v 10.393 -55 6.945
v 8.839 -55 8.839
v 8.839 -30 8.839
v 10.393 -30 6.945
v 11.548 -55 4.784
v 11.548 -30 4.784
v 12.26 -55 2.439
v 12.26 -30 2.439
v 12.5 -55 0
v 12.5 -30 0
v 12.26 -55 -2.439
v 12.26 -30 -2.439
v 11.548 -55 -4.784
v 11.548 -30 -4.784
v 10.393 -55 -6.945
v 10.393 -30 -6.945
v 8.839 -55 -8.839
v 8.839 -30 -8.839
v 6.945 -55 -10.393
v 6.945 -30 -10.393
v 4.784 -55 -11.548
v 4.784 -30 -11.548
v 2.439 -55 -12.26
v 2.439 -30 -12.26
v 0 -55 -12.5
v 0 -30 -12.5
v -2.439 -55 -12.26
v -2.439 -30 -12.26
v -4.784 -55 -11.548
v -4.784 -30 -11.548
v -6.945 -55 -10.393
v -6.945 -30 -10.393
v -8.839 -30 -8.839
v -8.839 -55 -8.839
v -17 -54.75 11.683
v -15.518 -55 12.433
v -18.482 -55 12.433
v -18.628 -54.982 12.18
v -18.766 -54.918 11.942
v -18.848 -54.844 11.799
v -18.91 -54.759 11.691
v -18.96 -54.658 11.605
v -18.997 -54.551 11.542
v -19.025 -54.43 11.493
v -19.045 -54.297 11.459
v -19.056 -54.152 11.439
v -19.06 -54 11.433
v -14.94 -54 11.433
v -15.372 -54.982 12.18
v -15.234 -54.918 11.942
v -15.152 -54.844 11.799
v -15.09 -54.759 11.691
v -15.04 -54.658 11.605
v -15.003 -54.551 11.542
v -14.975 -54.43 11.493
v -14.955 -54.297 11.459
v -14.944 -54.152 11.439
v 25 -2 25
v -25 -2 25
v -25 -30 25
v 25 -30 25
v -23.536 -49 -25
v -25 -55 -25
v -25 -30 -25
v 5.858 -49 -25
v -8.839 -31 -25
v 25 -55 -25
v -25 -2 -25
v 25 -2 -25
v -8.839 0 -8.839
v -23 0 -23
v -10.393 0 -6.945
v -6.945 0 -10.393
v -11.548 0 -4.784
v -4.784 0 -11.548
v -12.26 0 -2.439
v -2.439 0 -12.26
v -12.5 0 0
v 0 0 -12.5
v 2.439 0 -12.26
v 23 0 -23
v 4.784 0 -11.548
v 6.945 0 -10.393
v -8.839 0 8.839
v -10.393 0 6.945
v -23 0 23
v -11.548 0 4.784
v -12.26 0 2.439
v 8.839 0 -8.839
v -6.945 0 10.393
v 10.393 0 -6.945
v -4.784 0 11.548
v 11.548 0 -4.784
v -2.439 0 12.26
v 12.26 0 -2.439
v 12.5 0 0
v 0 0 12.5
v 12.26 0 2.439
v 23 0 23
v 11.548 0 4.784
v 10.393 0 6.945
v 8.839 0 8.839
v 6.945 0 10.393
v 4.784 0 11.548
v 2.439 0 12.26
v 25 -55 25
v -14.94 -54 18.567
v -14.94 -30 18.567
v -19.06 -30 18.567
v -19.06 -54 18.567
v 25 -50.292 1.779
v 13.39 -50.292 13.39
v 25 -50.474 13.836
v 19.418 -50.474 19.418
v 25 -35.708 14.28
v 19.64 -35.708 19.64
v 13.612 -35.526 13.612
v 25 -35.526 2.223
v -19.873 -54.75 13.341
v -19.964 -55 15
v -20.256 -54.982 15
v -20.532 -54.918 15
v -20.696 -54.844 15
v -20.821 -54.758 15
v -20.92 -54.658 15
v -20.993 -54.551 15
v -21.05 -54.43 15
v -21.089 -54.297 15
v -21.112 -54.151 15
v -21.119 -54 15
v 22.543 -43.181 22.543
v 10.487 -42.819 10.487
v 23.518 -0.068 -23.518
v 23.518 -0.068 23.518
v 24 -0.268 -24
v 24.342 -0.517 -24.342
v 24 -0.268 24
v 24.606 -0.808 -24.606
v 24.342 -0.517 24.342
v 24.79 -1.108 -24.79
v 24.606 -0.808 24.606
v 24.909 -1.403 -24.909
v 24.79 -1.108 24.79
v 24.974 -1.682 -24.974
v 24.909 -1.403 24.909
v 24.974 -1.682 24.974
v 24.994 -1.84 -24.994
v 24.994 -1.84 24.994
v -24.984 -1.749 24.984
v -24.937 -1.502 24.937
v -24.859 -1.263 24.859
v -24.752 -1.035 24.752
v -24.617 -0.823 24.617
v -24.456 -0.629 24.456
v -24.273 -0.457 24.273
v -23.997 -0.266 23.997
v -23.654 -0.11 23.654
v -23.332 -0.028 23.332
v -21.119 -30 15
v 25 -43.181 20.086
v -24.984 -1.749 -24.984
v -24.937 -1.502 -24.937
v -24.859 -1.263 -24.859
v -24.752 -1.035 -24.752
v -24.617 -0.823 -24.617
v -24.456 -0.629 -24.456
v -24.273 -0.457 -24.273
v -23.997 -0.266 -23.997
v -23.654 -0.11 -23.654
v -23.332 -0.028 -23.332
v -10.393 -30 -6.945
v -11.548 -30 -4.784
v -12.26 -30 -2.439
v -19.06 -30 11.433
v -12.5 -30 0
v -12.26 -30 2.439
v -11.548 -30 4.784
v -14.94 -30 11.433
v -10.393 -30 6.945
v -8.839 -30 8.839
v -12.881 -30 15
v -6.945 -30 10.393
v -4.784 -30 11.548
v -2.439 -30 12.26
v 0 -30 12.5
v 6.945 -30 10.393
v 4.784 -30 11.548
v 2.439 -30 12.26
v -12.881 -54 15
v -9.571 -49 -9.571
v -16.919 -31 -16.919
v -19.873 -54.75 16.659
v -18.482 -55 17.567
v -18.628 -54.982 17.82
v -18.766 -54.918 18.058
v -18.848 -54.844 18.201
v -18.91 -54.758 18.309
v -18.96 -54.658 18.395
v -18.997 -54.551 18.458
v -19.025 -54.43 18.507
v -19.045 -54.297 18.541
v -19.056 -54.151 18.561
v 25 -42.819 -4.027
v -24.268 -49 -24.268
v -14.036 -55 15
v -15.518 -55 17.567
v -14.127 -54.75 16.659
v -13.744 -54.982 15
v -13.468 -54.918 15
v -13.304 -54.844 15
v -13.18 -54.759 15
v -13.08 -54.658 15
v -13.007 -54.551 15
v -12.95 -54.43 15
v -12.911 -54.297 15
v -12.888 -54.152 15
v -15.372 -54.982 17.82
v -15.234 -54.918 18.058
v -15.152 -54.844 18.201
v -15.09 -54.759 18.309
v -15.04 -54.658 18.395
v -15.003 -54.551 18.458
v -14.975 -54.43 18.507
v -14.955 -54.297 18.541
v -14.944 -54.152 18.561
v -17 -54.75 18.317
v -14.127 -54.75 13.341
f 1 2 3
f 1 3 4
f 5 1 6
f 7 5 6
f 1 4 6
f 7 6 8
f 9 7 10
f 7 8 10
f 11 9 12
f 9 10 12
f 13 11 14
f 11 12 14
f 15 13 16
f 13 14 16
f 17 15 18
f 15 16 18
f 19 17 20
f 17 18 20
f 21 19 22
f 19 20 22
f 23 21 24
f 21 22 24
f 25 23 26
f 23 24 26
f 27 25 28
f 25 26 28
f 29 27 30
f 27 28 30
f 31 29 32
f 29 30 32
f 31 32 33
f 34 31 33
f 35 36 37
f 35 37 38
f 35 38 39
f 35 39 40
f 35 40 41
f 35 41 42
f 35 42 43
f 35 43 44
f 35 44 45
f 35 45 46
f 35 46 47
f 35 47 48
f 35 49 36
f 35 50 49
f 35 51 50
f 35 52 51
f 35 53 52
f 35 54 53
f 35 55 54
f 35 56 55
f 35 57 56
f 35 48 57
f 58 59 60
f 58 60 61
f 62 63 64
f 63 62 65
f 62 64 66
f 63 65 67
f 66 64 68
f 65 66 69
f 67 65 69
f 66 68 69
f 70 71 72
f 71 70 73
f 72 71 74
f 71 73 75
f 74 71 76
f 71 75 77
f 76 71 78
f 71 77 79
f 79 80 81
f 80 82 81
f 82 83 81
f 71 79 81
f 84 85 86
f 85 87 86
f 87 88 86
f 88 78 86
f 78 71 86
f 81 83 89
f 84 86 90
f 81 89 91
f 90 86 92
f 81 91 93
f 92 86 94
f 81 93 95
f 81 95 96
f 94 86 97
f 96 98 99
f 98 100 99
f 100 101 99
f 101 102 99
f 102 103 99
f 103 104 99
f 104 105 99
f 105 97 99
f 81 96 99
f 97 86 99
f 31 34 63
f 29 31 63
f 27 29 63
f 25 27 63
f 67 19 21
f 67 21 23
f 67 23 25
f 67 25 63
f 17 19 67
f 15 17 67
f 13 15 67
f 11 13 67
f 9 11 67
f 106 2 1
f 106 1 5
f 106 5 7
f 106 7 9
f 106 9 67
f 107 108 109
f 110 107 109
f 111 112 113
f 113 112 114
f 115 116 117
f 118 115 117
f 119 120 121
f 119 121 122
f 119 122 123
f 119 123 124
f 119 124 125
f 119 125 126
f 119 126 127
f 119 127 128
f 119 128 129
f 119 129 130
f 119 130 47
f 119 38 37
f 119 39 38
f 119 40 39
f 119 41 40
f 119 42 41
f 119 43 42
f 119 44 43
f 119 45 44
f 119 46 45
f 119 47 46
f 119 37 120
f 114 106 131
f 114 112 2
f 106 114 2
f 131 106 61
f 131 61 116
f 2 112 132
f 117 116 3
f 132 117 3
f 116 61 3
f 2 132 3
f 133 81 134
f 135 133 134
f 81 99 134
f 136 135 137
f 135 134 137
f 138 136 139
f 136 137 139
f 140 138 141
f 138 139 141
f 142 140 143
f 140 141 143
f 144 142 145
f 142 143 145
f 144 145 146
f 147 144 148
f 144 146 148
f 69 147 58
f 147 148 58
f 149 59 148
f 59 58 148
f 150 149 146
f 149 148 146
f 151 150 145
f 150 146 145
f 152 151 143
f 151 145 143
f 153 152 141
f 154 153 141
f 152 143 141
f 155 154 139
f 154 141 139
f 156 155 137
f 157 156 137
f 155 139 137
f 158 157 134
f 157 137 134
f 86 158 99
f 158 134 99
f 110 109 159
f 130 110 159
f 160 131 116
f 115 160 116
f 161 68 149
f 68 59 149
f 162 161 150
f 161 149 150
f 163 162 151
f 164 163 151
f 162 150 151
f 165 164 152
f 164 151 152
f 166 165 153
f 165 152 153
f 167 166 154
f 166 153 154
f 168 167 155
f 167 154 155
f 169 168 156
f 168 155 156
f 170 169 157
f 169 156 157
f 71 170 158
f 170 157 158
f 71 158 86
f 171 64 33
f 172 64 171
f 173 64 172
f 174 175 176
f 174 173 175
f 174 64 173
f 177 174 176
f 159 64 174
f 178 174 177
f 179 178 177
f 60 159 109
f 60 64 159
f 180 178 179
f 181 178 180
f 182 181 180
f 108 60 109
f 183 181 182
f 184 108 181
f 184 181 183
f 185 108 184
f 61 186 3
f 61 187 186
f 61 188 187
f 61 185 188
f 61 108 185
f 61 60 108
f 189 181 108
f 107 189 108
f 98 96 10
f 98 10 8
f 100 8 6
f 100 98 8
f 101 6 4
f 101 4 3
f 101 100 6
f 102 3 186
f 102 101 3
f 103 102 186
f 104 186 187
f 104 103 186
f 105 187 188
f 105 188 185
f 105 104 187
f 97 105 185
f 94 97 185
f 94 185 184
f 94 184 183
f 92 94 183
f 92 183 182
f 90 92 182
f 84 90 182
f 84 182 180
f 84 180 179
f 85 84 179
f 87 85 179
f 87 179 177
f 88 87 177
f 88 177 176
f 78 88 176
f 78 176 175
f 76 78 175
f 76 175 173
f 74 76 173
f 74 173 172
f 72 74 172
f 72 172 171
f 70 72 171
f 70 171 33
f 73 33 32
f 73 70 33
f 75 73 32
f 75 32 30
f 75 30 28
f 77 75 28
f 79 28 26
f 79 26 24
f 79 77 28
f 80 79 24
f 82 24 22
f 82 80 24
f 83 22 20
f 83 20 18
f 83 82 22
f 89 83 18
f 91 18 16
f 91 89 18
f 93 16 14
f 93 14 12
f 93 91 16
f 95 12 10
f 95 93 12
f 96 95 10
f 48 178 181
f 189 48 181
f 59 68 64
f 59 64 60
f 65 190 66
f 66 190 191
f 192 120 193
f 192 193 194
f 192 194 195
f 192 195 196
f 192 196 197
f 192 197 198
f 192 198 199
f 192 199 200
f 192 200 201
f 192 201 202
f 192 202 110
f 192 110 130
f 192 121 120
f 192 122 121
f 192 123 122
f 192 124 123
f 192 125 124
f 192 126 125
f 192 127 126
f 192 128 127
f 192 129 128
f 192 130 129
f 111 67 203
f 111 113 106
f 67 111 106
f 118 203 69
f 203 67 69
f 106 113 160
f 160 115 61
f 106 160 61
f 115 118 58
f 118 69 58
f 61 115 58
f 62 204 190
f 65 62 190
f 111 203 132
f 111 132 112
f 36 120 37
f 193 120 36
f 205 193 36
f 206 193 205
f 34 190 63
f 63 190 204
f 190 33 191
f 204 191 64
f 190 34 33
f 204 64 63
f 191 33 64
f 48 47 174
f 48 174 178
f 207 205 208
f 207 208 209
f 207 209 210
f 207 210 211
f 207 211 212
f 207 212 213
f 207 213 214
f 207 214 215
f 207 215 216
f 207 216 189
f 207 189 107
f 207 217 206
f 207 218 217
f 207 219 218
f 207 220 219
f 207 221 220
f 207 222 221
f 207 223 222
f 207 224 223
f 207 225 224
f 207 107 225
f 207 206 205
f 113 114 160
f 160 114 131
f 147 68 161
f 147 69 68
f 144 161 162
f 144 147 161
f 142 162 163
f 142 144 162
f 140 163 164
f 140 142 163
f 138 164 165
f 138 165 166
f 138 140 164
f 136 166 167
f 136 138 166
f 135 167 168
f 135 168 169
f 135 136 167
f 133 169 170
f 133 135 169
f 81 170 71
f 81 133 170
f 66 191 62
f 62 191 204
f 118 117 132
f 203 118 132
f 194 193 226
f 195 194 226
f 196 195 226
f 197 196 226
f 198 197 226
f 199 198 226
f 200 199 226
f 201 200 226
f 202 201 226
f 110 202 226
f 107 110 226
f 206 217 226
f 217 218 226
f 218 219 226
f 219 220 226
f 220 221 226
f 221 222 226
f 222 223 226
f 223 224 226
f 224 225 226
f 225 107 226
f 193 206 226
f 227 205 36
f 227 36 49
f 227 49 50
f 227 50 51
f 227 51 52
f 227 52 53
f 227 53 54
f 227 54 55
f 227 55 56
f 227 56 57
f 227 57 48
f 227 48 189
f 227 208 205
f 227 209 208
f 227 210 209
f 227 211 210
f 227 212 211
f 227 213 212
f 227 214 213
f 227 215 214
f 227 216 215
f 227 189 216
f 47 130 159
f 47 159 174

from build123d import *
from build123d import SkipClean  # not in build123d's __all__

# Parameters (mm, degrees)
F0_W        = 50
F0_H        = 50
F0_R        = 12.5
F1_DEPTH    = 30
F2_DEPTH    = 25
F4_DEPTH    = 25
F6_DEPTH    = 50
F8_DEPTH    = 25
F9_T1_DEPTH = 9.1191559928
F9_T3_DEPTH = 9.1191559928
F9_T5_DEPTH = 9.1191559928
F9_T7_DEPTH = 9.1191559928
F9_T9_DEPTH = 9.1191559928
F10_R       = 2


# Not quite as in the source:
# - a fillet or chamfer that OpenCascade refuses, or shapes differently, is made with other operations: its cross-section is extruded or revolved along the edge and cut away or added
# - after a boolean that leaves OpenCascade's solid faulty, fix() repairs it


with BuildPart() as f1:
    # F0 (on Front) → F1 (new body)
    with BuildSketch(Plane.XZ):
        Rectangle(F0_W, F0_H)
        Circle(F0_R, mode=Mode.SUBTRACT)
    extrude(amount=F1_DEPTH)

    # F0 (on Front) → F2 (join)
    with BuildSketch(Plane.XZ):
        Rectangle(F0_W, F0_H)
        Circle(F0_R, mode=Mode.SUBTRACT)
    extrude(amount=F2_DEPTH)

    # F3 (on face) → F4 (join)
    with BuildSketch(Plane.XZ.offset(30)):
        with BuildLine():
            Line((-8.8388347648, -8.8388347648), (-25, -25))
            Line((-25, -25), (25, -25))
            Line((25, -25), (25, 25))
            Line((25, 25), (8.8388347648, 8.8388347648))
            ThreePointArc((8.8388347648, 8.8388347648), (8.8388347648, -8.8388347648), (-8.8388347648, -8.8388347648))
        make_face()
    with SkipClean():  # cleaning this boolean's faces spoils the solid; the shape is the same uncleaned
        extrude(amount=F4_DEPTH)

    # F5 (on face) → F6 (cut)
    with BuildSketch(Plane(origin=(0, 0, 0), x_dir=(0.7071067812, 0, 0.7071067812), z_dir=(-0.7071067812, 0, 0.7071067812))):
        Polygon((-23.9276695297, -31), (-34.3199743751, -49), (-13.5353646843, -49), align=None)
        Polygon((19.249809042, -35.5263909924), (14.8302387921, -42.8186887872), (18.9357688095, -50.2922977948), (27.4608690767, -50.4736090076), (31.8804393265, -43.1813112128), (27.7749093092, -35.7077022052), align=None)
    extrude(amount=-F6_DEPTH, mode=Mode.SUBTRACT)

    add(f1.part.fix(), mode=Mode.REPLACE)

    # F7 (on face) → F8 (join)
    with BuildSketch(Plane.XZ.offset(30)):
        Polygon((-19.0595779964, 11.4327062681), (-14.9404220036, 11.4327062681), (-12.8808440072, 15), (-14.9404220036, 18.5672937319), (-19.0595779964, 18.5672937319), (-21.1191559928, 15), align=None)
    extrude(amount=F8_DEPTH)

    # F9: fillet of radius 1 on 6 edges, made by hand

    # F9_s2 → F9_t1 (cut)
    with BuildSketch(Plane(origin=(4.5249795266, 0, 7.8374944433), x_dir=(0, 1, 0), z_dir=(-0.5, 0, -0.8660254038))):
        with BuildLine():
            add(Edge.make_bspline(
                [(-54, -25.7897255963), (-55, -25.7897255963), (-55, -24.7897255963)],
                knots=[0, 0, 0, 1, 1, 1], degree=2, weights=[1, 1, 1]))
            Line((-55, -24.7897255963), (-55, -25.7897255963))
            Line((-55, -25.7897255963), (-54, -25.7897255963))
        make_face()
    extrude(amount=F9_T1_DEPTH, mode=Mode.SUBTRACT)

    # F9_s4 → F9_t3 (cut)
    with BuildSketch(Plane(origin=(-13.0249795266, 0, 22.5599263076), x_dir=(0, 1, 0), z_dir=(0.5, 0, -0.8660254038))):
        with BuildLine():
            add(Edge.make_bspline(
                [(-54, -10.7897255963), (-55, -10.7897255963), (-55, -9.7897255963)],
                knots=[0, 0, 0, 1, 1, 1], degree=2, weights=[1, 1, 1]))
            Line((-55, -9.7897255963), (-55, -10.7897255963))
            Line((-55, -10.7897255963), (-54, -10.7897255963))
        make_face()
    extrude(amount=F9_T3_DEPTH, mode=Mode.SUBTRACT)

    # F9_s6 → F9_t5 (cut)
    with BuildSketch(Plane.YZ.offset(-21.5595779964)):
        with BuildLine():
            add(Edge.make_bspline(
                [(-54, 11.4327062681), (-55, 11.4327062681), (-55, 12.4327062681)],
                knots=[0, 0, 0, 1, 1, 1], degree=2, weights=[1, 1, 1]))
            Line((-55, 12.4327062681), (-55, 11.4327062681))
            Line((-55, 11.4327062681), (-54, 11.4327062681))
        make_face()
        with BuildLine():
            add(Edge.make_bspline(
                [(-54, 18.5672937319), (-55, 18.5672937319), (-55, 17.5672937319)],
                knots=[0, 0, 0, 1, 1, 1], degree=2, weights=[1, 1, 1]))
            Line((-55, 17.5672937319), (-55, 18.5672937319))
            Line((-55, 18.5672937319), (-54, 18.5672937319))
        make_face()
    extrude(amount=F9_T5_DEPTH, mode=Mode.SUBTRACT)

    # F9_s8 → F9_t7 (cut)
    with BuildSketch(Plane(origin=(-0.0345984698, 0, -0.0599263076), x_dir=(0, 1, 0), z_dir=(0.5, 0, 0.8660254038))):
        with BuildLine():
            add(Edge.make_bspline(
                [(-54, 18.6551381324), (-55, 18.6551381324), (-55, 19.6551381324)],
                knots=[0, 0, 0, 1, 1, 1], degree=2, weights=[1, 1, 1]))
            Line((-55, 19.6551381324), (-55, 18.6551381324))
            Line((-55, 18.6551381324), (-54, 18.6551381324))
        make_face()
    extrude(amount=F9_T7_DEPTH, mode=Mode.SUBTRACT)

    # F9_s10 → F9_t9 (cut)
    with BuildSketch(Plane(origin=(-8.4654015302, 0, 14.6625055567), x_dir=(0, 1, 0), z_dir=(-0.5, 0, 0.8660254038))):
        with BuildLine():
            add(Edge.make_bspline(
                [(-54, 3.6551381324), (-55, 3.6551381324), (-55, 4.6551381324)],
                knots=[0, 0, 0, 1, 1, 1], degree=2, weights=[1, 1, 1]))
            Line((-55, 4.6551381324), (-55, 3.6551381324))
            Line((-55, 3.6551381324), (-54, 3.6551381324))
        make_face()
    extrude(amount=F9_T9_DEPTH, mode=Mode.SUBTRACT)

    # F10
    f10_edges = [f1.edges().sort_by_distance(p)[0] for p in [
        (25, 0, 0),
        (0, 0, -25),
        (-25, 0, 0),
        (0, 0, 25),
    ]]
    fillet(f10_edges, radius=F10_R)


solid = f1.part
